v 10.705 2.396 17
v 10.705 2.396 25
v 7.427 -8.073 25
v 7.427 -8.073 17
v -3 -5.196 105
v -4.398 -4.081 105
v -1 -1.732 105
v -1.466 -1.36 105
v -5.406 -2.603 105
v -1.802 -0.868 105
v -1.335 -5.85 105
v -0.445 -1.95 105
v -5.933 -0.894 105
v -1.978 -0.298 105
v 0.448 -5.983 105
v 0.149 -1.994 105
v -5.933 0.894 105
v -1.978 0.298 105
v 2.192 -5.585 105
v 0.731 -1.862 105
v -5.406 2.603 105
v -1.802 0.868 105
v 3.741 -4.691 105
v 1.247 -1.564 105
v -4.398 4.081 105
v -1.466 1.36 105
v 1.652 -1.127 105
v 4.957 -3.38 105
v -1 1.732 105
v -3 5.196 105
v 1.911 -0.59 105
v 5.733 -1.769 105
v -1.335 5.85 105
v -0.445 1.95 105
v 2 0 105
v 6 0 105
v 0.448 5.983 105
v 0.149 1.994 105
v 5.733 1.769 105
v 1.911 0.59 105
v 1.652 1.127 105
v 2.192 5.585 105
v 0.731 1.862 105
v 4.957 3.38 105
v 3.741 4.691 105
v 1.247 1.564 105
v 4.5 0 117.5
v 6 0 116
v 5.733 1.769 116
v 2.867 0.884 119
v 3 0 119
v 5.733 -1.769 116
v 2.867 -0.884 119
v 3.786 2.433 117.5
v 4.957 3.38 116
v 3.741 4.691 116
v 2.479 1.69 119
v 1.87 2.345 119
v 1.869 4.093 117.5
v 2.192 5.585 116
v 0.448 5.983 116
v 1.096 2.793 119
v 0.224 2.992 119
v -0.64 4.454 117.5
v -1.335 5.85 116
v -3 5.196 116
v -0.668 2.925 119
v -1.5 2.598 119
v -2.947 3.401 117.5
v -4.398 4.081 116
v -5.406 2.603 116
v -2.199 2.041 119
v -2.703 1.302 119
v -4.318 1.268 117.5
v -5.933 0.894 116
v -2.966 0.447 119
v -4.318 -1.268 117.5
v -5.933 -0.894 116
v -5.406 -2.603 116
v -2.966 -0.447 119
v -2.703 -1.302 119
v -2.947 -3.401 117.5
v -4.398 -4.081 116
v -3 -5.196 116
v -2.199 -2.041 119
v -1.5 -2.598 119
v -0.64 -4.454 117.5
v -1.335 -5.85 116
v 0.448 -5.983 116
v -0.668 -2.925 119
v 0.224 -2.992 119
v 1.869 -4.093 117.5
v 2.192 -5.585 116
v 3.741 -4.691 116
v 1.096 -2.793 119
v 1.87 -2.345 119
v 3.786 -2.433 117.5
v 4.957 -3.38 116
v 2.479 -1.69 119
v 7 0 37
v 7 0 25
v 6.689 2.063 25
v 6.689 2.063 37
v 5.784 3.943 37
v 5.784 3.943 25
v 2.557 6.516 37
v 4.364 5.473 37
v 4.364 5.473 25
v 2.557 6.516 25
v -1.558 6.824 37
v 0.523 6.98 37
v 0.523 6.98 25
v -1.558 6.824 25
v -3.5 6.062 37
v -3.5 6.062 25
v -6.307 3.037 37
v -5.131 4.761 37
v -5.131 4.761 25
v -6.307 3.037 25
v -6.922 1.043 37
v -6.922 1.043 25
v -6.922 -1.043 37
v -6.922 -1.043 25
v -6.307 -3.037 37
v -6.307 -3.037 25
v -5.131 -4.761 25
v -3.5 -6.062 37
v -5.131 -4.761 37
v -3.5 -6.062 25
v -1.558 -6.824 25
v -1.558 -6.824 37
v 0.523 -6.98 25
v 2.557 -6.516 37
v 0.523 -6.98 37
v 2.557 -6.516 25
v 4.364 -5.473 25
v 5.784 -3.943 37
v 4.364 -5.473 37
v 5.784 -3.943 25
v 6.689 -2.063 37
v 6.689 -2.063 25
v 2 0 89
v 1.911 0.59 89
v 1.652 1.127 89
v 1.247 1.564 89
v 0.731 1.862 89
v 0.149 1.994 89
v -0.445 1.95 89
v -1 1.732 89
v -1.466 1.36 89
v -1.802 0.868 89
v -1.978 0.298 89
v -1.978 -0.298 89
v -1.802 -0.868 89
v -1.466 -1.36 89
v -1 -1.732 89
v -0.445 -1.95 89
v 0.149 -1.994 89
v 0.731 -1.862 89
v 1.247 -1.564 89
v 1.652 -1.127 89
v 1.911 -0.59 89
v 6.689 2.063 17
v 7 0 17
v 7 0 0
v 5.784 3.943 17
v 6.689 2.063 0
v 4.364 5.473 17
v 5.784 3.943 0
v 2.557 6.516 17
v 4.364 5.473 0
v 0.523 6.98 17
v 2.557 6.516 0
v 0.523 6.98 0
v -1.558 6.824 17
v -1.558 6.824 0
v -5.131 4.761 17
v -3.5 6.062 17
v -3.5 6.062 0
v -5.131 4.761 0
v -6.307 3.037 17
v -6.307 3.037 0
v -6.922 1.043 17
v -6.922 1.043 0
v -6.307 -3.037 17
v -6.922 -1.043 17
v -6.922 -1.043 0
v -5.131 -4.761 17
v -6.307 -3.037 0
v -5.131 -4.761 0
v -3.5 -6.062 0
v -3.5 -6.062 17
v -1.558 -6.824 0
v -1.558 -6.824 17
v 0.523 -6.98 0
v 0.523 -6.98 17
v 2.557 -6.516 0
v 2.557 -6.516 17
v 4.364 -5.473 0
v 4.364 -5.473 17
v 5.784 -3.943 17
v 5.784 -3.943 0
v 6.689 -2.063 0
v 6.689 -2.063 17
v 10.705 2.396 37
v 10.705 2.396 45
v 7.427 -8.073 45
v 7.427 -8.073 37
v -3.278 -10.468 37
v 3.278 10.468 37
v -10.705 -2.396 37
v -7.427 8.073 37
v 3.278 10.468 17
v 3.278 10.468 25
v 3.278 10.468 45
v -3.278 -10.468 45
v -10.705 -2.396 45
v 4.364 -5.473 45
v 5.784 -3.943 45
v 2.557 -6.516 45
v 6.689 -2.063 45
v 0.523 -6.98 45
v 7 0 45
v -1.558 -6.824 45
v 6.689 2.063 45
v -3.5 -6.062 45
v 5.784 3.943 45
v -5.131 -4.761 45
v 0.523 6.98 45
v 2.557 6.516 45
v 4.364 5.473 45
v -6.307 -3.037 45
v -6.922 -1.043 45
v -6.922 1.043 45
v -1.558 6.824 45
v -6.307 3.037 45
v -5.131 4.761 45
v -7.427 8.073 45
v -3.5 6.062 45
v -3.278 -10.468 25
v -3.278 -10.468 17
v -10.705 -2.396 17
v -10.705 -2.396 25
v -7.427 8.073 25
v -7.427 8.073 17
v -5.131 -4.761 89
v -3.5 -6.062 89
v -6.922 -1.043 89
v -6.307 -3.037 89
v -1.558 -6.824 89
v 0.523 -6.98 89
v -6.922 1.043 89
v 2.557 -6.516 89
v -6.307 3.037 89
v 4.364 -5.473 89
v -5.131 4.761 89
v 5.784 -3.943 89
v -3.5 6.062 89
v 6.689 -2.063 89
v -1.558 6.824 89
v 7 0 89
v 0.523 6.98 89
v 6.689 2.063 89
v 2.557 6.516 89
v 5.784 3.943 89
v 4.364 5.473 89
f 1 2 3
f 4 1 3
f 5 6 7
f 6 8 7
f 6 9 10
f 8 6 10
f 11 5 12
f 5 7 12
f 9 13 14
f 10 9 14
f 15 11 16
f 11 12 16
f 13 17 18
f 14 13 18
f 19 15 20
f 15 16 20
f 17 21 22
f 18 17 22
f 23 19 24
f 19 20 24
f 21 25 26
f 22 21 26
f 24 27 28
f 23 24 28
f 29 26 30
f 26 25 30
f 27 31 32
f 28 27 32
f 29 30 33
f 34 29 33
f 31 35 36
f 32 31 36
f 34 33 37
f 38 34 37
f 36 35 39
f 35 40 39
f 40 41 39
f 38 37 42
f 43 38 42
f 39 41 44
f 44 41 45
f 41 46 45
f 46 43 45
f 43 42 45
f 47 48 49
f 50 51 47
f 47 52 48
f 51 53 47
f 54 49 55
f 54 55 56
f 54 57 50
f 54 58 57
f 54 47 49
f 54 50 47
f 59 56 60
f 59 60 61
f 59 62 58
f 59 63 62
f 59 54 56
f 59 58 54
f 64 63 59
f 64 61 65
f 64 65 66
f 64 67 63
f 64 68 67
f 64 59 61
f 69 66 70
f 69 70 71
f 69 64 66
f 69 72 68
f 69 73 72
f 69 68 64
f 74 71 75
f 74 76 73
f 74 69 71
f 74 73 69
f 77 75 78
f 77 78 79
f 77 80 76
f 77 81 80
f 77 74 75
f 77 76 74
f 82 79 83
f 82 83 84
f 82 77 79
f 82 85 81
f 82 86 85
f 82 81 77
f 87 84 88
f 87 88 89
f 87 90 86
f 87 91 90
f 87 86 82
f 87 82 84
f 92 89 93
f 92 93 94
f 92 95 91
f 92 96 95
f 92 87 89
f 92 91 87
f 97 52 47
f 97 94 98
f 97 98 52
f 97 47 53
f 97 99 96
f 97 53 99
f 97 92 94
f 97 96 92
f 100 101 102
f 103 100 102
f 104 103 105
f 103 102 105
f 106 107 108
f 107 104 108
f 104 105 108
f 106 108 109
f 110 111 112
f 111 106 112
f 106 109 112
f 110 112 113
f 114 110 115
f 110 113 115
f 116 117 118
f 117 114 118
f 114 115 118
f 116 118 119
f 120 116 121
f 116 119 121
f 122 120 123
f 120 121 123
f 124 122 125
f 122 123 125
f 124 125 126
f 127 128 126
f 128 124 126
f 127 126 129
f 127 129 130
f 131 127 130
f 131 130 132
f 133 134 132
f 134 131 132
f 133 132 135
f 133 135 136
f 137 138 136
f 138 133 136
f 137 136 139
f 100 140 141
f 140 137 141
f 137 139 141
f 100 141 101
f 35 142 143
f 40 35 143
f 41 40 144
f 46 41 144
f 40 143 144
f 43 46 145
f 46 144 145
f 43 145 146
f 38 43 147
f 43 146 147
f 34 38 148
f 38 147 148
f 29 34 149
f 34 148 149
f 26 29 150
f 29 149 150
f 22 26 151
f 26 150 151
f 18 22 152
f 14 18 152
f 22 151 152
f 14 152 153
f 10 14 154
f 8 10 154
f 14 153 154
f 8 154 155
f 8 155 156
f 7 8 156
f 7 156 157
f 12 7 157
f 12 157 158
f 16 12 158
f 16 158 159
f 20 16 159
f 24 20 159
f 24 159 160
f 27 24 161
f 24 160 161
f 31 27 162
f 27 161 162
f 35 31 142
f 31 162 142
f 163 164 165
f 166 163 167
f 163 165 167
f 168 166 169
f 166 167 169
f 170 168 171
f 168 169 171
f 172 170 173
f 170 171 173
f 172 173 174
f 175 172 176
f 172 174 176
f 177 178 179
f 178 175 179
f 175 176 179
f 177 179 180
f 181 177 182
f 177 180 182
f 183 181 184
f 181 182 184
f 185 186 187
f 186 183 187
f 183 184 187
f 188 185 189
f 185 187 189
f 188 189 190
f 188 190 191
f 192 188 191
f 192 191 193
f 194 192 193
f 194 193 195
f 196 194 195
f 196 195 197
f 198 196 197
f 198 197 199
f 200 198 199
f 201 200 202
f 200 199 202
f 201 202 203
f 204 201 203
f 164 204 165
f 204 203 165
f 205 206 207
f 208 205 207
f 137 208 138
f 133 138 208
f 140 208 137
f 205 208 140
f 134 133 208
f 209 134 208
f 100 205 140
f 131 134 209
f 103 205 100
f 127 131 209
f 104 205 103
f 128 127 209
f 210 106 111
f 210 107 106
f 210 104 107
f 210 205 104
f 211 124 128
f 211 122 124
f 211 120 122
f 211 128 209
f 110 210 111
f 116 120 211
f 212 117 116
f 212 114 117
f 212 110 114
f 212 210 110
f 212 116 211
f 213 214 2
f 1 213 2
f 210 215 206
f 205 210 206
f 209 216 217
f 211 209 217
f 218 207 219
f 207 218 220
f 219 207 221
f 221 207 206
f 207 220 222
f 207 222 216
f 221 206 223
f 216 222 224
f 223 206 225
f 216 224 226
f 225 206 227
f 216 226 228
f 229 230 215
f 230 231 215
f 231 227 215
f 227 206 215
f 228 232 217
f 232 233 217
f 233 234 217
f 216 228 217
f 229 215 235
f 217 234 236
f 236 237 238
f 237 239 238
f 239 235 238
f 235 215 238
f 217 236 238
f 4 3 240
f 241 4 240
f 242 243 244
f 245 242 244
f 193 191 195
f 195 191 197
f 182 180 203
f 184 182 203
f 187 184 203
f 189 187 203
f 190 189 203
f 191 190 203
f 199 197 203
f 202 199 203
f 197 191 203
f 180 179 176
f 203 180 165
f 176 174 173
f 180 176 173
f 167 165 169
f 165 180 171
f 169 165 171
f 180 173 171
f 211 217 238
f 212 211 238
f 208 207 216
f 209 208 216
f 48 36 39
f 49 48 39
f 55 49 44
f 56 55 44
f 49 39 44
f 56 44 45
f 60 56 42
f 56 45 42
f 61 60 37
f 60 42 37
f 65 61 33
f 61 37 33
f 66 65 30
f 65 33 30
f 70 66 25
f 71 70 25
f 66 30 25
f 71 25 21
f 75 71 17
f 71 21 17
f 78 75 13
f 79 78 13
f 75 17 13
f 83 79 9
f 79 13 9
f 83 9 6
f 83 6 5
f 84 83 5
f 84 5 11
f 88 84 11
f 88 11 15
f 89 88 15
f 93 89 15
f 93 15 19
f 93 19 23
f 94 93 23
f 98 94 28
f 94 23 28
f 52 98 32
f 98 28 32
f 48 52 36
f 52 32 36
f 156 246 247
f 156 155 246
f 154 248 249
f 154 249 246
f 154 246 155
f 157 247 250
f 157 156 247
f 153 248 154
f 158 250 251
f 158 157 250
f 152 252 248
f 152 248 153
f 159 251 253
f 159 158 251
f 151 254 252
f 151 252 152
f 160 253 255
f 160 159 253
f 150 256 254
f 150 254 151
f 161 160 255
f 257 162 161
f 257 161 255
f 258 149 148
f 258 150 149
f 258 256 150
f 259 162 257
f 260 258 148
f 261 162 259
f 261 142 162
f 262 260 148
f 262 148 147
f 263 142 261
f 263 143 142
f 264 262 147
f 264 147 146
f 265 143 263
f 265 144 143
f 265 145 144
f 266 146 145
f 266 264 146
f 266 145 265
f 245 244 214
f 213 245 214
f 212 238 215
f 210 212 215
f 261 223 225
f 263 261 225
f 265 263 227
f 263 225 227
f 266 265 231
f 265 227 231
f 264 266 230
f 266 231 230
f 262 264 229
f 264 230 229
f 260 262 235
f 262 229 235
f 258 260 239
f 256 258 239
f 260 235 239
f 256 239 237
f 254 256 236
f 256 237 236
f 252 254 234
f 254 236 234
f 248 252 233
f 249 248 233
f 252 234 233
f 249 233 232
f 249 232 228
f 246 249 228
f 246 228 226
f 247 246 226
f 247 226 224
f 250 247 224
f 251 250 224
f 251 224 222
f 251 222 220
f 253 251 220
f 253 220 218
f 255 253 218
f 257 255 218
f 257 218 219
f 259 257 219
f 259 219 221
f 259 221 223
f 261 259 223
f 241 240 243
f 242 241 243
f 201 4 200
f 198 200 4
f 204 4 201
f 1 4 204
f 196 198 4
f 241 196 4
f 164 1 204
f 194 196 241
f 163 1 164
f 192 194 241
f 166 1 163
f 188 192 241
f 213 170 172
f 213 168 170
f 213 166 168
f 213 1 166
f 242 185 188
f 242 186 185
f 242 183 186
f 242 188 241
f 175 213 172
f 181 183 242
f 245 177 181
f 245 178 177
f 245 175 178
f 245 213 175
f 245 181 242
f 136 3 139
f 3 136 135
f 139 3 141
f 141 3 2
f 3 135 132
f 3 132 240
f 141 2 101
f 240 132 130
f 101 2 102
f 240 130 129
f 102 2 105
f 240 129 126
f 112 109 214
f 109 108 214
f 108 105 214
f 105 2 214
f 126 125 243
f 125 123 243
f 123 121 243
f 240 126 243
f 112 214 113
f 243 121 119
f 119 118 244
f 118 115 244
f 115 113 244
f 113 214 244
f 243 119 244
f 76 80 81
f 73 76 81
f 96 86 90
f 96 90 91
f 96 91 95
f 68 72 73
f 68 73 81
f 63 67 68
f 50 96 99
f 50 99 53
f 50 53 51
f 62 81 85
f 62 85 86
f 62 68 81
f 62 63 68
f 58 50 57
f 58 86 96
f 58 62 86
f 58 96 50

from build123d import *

# Parameters (mm, degrees)
SKETCH_1_R             = 7
EXTRUDE_1_DEPTH        = 89
SKETCH_2_R             = 2
EXTRUDE_2_DEPTH        = 16
SKETCH_3_R             = 6
EXTRUDE_3_DEPTH        = 14
CHAMFER_1_SIZE         = 3
EXTRUDE_4_DEPTH        = 8
PATTERN_LINEAR_1_COUNT = 2
PATTERN_LINEAR_1_PITCH = 20


with BuildPart() as part:
    # 草图1 → 凸台-拉伸1 (new body)
    with BuildSketch(Plane.XY):
        Circle(SKETCH_1_R)
    extrude(amount=EXTRUDE_1_DEPTH)

    # 草图2 → 凸台-拉伸2 (add)
    with BuildSketch(Plane.XY.offset(89)):
        Circle(SKETCH_2_R)
    extrude(amount=EXTRUDE_2_DEPTH)

    # 草图3 → 凸台-拉伸3 (add)
    with BuildSketch(Plane.XY.offset(105)):
        Circle(SKETCH_3_R)
    extrude(amount=EXTRUDE_3_DEPTH)

    # 倒角1
    chamfer_1_edges = [part.edges().sort_by_distance(p)[0] for p in [
        (-6, 0, 119),
    ]]
    chamfer(chamfer_1_edges, length=CHAMFER_1_SIZE)

    # 草图4 → 凸台-拉伸4 (add)
    with BuildSketch(Plane(origin=(0, 0, 25), x_dir=(-1, 0, 0), z_dir=(0, 0, -1))):
        Polygon((-3.277805691, 10.468491925), (-10.704882792, 2.395582966), (-7.427077101, -8.07290896), (3.277805691, -10.468491925), (10.704882792, -2.395582966), (7.427077101, 8.07290896), align=None)
    extrude_4 = extrude(amount=EXTRUDE_4_DEPTH)

    # 阵列(线性)1: 凸台-拉伸4 ×2
    with Locations(*[(0, 0, i * PATTERN_LINEAR_1_PITCH) for i in range(1, PATTERN_LINEAR_1_COUNT)]):
        add(extrude_4)


solid = part.part
